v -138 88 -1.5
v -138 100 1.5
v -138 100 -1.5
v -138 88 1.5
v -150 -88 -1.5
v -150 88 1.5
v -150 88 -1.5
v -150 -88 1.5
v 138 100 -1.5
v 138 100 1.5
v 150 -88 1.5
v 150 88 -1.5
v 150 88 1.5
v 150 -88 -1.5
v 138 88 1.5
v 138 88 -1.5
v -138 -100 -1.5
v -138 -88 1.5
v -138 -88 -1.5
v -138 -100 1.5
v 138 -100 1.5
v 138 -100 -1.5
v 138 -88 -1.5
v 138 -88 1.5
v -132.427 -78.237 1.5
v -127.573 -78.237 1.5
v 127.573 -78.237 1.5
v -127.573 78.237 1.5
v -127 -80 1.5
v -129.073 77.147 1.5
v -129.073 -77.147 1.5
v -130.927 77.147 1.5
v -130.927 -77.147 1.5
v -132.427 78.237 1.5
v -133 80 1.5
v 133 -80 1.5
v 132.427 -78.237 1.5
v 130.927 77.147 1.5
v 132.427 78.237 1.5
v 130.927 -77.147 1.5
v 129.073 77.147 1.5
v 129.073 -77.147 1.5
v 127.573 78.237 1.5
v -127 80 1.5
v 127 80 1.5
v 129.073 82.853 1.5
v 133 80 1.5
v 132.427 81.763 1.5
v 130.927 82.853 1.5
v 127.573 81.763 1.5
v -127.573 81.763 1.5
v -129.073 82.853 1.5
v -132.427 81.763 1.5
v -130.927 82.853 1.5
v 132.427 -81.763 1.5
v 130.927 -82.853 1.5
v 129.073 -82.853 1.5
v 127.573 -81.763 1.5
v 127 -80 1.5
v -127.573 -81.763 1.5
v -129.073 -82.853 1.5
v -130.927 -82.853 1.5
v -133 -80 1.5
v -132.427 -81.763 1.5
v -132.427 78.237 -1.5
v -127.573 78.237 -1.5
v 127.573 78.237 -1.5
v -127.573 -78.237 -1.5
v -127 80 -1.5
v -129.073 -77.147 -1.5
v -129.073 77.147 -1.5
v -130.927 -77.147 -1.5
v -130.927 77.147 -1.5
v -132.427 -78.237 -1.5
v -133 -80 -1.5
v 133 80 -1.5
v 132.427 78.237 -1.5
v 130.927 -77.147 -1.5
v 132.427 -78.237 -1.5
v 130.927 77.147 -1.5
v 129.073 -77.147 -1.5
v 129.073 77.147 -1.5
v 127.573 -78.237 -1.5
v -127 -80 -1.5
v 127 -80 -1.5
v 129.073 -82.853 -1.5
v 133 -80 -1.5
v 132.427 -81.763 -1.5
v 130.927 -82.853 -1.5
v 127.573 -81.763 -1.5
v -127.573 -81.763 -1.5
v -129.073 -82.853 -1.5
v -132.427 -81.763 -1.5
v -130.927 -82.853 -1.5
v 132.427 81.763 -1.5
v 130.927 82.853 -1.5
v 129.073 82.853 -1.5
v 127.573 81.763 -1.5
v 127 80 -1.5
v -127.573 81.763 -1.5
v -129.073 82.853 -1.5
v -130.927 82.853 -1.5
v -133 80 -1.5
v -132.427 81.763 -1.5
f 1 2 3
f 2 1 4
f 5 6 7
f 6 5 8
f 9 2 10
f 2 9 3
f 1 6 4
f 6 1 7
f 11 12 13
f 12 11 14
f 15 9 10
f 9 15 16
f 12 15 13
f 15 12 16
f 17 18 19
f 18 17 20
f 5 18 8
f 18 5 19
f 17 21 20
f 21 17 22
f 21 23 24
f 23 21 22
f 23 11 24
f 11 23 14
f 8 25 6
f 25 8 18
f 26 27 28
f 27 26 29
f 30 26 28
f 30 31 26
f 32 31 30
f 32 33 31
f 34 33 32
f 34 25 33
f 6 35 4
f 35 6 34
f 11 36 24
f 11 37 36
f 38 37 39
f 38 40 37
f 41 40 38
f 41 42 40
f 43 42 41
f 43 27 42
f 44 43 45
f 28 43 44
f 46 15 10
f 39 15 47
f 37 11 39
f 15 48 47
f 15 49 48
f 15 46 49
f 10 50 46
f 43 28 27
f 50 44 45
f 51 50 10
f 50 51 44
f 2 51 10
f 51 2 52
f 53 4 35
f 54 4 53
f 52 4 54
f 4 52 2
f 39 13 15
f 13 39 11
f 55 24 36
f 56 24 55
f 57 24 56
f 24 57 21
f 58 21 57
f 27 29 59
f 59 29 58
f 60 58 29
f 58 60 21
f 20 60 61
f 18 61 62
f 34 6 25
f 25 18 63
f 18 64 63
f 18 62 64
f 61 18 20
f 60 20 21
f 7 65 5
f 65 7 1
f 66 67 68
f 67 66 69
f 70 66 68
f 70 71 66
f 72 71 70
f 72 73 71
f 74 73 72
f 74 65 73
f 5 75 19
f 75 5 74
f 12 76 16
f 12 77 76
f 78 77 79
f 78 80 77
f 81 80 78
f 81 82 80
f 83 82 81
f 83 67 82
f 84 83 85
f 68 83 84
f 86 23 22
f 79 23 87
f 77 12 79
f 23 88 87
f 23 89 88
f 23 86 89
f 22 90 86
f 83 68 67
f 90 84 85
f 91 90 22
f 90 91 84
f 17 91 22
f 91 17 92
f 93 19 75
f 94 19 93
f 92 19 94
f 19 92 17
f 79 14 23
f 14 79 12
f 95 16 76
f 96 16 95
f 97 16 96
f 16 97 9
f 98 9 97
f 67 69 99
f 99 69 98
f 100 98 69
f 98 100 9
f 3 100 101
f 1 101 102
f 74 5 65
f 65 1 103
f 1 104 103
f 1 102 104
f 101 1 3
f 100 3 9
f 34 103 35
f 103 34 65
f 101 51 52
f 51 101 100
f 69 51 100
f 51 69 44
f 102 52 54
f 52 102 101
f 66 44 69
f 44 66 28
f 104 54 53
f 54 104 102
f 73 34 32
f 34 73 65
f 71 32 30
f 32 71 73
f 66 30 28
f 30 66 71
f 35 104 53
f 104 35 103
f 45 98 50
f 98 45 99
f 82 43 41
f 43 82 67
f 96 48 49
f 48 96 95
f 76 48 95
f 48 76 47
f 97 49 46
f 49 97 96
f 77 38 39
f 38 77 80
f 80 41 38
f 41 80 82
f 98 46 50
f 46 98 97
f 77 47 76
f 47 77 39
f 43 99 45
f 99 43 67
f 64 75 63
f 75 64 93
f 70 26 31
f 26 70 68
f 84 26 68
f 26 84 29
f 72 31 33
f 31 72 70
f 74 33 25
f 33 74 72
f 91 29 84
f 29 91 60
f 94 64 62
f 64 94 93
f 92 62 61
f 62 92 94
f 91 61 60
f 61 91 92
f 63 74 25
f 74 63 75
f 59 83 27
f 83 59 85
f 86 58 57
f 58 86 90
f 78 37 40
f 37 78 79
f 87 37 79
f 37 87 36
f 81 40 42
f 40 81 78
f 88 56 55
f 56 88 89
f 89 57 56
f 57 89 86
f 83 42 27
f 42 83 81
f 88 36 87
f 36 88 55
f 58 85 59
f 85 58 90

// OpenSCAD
// Parameters
sheet_length = 300; //[150:600:1]
sheet_width = 200; //[100:400:1]
sheet_thickness = 3; //[1.5:6:0.5]
corner_radius = 12; //[6:24:1]
chamfer_size = 1; //[0.5:3:0.5]
hole_diameter = 6; //[3:12:0.5]
hole_edge_margin = 20; //[10:40:1]
hole_clearance_z = 1; //[0.5:3:0.5]
overlap = 1; //[0.5:2:0.5]

// Base shapes
module acrylic_sheet_body() {
  cube([sheet_length, sheet_width, sheet_thickness], center = true);
}

module rounded_corner_cut_cyl() {
  cylinder(r = corner_radius, h = sheet_thickness + 2 * overlap, center = true);
}

module rounded_corner_cut_box() {
  cube([corner_radius, corner_radius, sheet_thickness + 2 * overlap], center = true);
}

module mounting_hole_cyl() {
  cylinder(r = hole_diameter / 2, h = sheet_thickness + 2 * hole_clearance_z, center = true);
}

module edge_chamfer_wedge_x() {
  rotate([0, 45, 0])
    cube([chamfer_size, sheet_width + 2 * overlap, chamfer_size], center = true);
}

module edge_chamfer_wedge_y() {
  rotate([45, 0, 0])
    cube([sheet_length + 2 * overlap, chamfer_size, chamfer_size], center = true);
}

// Operations
module rounded_corners() {
  union() {
    translate([-sheet_length / 2 + corner_radius / 2, sheet_width / 2 - corner_radius / 2, 0])
      difference() {
        rounded_corner_cut_box();
        translate([-sheet_length / 2 + corner_radius, sheet_width / 2 - corner_radius, 0])
          rounded_corner_cut_cyl();
      }
    translate([sheet_length / 2 - corner_radius / 2, sheet_width / 2 - corner_radius / 2, 0])
      difference() {
        rounded_corner_cut_box();
        translate([sheet_length / 2 - corner_radius, sheet_width / 2 - corner_radius, 0])
          rounded_corner_cut_cyl();
      }
    translate([-sheet_length / 2 + corner_radius / 2, -sheet_width / 2 + corner_radius / 2, 0])
      difference() {
        rounded_corner_cut_box();
        translate([-sheet_length / 2 + corner_radius, -sheet_width / 2 + corner_radius, 0])
          rounded_corner_cut_cyl();
      }
    translate([sheet_length / 2 - corner_radius / 2, -sheet_width / 2 + corner_radius / 2, 0])
      difference() {
        rounded_corner_cut_box();
        translate([sheet_length / 2 - corner_radius, -sheet_width / 2 + corner_radius, 0])
          rounded_corner_cut_cyl();
      }
  }
}

module mounting_holes() {
  union() {
    translate([-sheet_length / 2 + hole_edge_margin, sheet_width / 2 - hole_edge_margin, 0])
      mounting_hole_cyl();
    translate([sheet_length / 2 - hole_edge_margin, sheet_width / 2 - hole_edge_margin, 0])
      mounting_hole_cyl();
    translate([-sheet_length / 2 + hole_edge_margin, -sheet_width / 2 + hole_edge_margin, 0])
      mounting_hole_cyl();
    translate([sheet_length / 2 - hole_edge_margin, -sheet_width / 2 + hole_edge_margin, 0])
      mounting_hole_cyl();
  }
}

module edge_chamfer() {
  union() {
    translate([sheet_length / 2 - chamfer_size / 2 + overlap, 0, sheet_thickness / 2 - chamfer_size / 2 + overlap])
      edge_chamfer_wedge_x();
    translate([-sheet_length / 2 + chamfer_size / 2 - overlap, 0, sheet_thickness / 2 - chamfer_size / 2 + overlap])
      edge_chamfer_wedge_x();
    translate([0, sheet_width / 2 - chamfer_size / 2 + overlap, sheet_thickness / 2 - chamfer_size / 2 + overlap])
      edge_chamfer_wedge_y();
    translate([0, -sheet_width / 2 + chamfer_size / 2 - overlap, sheet_thickness / 2 - chamfer_size / 2 + overlap])
      edge_chamfer_wedge_y();
  }
}

// Final model
difference() {
  difference() {
    difference() {
      acrylic_sheet_body();
      rounded_corners();
    }
    mounting_holes();
  }
  edge_chamfer();
}
